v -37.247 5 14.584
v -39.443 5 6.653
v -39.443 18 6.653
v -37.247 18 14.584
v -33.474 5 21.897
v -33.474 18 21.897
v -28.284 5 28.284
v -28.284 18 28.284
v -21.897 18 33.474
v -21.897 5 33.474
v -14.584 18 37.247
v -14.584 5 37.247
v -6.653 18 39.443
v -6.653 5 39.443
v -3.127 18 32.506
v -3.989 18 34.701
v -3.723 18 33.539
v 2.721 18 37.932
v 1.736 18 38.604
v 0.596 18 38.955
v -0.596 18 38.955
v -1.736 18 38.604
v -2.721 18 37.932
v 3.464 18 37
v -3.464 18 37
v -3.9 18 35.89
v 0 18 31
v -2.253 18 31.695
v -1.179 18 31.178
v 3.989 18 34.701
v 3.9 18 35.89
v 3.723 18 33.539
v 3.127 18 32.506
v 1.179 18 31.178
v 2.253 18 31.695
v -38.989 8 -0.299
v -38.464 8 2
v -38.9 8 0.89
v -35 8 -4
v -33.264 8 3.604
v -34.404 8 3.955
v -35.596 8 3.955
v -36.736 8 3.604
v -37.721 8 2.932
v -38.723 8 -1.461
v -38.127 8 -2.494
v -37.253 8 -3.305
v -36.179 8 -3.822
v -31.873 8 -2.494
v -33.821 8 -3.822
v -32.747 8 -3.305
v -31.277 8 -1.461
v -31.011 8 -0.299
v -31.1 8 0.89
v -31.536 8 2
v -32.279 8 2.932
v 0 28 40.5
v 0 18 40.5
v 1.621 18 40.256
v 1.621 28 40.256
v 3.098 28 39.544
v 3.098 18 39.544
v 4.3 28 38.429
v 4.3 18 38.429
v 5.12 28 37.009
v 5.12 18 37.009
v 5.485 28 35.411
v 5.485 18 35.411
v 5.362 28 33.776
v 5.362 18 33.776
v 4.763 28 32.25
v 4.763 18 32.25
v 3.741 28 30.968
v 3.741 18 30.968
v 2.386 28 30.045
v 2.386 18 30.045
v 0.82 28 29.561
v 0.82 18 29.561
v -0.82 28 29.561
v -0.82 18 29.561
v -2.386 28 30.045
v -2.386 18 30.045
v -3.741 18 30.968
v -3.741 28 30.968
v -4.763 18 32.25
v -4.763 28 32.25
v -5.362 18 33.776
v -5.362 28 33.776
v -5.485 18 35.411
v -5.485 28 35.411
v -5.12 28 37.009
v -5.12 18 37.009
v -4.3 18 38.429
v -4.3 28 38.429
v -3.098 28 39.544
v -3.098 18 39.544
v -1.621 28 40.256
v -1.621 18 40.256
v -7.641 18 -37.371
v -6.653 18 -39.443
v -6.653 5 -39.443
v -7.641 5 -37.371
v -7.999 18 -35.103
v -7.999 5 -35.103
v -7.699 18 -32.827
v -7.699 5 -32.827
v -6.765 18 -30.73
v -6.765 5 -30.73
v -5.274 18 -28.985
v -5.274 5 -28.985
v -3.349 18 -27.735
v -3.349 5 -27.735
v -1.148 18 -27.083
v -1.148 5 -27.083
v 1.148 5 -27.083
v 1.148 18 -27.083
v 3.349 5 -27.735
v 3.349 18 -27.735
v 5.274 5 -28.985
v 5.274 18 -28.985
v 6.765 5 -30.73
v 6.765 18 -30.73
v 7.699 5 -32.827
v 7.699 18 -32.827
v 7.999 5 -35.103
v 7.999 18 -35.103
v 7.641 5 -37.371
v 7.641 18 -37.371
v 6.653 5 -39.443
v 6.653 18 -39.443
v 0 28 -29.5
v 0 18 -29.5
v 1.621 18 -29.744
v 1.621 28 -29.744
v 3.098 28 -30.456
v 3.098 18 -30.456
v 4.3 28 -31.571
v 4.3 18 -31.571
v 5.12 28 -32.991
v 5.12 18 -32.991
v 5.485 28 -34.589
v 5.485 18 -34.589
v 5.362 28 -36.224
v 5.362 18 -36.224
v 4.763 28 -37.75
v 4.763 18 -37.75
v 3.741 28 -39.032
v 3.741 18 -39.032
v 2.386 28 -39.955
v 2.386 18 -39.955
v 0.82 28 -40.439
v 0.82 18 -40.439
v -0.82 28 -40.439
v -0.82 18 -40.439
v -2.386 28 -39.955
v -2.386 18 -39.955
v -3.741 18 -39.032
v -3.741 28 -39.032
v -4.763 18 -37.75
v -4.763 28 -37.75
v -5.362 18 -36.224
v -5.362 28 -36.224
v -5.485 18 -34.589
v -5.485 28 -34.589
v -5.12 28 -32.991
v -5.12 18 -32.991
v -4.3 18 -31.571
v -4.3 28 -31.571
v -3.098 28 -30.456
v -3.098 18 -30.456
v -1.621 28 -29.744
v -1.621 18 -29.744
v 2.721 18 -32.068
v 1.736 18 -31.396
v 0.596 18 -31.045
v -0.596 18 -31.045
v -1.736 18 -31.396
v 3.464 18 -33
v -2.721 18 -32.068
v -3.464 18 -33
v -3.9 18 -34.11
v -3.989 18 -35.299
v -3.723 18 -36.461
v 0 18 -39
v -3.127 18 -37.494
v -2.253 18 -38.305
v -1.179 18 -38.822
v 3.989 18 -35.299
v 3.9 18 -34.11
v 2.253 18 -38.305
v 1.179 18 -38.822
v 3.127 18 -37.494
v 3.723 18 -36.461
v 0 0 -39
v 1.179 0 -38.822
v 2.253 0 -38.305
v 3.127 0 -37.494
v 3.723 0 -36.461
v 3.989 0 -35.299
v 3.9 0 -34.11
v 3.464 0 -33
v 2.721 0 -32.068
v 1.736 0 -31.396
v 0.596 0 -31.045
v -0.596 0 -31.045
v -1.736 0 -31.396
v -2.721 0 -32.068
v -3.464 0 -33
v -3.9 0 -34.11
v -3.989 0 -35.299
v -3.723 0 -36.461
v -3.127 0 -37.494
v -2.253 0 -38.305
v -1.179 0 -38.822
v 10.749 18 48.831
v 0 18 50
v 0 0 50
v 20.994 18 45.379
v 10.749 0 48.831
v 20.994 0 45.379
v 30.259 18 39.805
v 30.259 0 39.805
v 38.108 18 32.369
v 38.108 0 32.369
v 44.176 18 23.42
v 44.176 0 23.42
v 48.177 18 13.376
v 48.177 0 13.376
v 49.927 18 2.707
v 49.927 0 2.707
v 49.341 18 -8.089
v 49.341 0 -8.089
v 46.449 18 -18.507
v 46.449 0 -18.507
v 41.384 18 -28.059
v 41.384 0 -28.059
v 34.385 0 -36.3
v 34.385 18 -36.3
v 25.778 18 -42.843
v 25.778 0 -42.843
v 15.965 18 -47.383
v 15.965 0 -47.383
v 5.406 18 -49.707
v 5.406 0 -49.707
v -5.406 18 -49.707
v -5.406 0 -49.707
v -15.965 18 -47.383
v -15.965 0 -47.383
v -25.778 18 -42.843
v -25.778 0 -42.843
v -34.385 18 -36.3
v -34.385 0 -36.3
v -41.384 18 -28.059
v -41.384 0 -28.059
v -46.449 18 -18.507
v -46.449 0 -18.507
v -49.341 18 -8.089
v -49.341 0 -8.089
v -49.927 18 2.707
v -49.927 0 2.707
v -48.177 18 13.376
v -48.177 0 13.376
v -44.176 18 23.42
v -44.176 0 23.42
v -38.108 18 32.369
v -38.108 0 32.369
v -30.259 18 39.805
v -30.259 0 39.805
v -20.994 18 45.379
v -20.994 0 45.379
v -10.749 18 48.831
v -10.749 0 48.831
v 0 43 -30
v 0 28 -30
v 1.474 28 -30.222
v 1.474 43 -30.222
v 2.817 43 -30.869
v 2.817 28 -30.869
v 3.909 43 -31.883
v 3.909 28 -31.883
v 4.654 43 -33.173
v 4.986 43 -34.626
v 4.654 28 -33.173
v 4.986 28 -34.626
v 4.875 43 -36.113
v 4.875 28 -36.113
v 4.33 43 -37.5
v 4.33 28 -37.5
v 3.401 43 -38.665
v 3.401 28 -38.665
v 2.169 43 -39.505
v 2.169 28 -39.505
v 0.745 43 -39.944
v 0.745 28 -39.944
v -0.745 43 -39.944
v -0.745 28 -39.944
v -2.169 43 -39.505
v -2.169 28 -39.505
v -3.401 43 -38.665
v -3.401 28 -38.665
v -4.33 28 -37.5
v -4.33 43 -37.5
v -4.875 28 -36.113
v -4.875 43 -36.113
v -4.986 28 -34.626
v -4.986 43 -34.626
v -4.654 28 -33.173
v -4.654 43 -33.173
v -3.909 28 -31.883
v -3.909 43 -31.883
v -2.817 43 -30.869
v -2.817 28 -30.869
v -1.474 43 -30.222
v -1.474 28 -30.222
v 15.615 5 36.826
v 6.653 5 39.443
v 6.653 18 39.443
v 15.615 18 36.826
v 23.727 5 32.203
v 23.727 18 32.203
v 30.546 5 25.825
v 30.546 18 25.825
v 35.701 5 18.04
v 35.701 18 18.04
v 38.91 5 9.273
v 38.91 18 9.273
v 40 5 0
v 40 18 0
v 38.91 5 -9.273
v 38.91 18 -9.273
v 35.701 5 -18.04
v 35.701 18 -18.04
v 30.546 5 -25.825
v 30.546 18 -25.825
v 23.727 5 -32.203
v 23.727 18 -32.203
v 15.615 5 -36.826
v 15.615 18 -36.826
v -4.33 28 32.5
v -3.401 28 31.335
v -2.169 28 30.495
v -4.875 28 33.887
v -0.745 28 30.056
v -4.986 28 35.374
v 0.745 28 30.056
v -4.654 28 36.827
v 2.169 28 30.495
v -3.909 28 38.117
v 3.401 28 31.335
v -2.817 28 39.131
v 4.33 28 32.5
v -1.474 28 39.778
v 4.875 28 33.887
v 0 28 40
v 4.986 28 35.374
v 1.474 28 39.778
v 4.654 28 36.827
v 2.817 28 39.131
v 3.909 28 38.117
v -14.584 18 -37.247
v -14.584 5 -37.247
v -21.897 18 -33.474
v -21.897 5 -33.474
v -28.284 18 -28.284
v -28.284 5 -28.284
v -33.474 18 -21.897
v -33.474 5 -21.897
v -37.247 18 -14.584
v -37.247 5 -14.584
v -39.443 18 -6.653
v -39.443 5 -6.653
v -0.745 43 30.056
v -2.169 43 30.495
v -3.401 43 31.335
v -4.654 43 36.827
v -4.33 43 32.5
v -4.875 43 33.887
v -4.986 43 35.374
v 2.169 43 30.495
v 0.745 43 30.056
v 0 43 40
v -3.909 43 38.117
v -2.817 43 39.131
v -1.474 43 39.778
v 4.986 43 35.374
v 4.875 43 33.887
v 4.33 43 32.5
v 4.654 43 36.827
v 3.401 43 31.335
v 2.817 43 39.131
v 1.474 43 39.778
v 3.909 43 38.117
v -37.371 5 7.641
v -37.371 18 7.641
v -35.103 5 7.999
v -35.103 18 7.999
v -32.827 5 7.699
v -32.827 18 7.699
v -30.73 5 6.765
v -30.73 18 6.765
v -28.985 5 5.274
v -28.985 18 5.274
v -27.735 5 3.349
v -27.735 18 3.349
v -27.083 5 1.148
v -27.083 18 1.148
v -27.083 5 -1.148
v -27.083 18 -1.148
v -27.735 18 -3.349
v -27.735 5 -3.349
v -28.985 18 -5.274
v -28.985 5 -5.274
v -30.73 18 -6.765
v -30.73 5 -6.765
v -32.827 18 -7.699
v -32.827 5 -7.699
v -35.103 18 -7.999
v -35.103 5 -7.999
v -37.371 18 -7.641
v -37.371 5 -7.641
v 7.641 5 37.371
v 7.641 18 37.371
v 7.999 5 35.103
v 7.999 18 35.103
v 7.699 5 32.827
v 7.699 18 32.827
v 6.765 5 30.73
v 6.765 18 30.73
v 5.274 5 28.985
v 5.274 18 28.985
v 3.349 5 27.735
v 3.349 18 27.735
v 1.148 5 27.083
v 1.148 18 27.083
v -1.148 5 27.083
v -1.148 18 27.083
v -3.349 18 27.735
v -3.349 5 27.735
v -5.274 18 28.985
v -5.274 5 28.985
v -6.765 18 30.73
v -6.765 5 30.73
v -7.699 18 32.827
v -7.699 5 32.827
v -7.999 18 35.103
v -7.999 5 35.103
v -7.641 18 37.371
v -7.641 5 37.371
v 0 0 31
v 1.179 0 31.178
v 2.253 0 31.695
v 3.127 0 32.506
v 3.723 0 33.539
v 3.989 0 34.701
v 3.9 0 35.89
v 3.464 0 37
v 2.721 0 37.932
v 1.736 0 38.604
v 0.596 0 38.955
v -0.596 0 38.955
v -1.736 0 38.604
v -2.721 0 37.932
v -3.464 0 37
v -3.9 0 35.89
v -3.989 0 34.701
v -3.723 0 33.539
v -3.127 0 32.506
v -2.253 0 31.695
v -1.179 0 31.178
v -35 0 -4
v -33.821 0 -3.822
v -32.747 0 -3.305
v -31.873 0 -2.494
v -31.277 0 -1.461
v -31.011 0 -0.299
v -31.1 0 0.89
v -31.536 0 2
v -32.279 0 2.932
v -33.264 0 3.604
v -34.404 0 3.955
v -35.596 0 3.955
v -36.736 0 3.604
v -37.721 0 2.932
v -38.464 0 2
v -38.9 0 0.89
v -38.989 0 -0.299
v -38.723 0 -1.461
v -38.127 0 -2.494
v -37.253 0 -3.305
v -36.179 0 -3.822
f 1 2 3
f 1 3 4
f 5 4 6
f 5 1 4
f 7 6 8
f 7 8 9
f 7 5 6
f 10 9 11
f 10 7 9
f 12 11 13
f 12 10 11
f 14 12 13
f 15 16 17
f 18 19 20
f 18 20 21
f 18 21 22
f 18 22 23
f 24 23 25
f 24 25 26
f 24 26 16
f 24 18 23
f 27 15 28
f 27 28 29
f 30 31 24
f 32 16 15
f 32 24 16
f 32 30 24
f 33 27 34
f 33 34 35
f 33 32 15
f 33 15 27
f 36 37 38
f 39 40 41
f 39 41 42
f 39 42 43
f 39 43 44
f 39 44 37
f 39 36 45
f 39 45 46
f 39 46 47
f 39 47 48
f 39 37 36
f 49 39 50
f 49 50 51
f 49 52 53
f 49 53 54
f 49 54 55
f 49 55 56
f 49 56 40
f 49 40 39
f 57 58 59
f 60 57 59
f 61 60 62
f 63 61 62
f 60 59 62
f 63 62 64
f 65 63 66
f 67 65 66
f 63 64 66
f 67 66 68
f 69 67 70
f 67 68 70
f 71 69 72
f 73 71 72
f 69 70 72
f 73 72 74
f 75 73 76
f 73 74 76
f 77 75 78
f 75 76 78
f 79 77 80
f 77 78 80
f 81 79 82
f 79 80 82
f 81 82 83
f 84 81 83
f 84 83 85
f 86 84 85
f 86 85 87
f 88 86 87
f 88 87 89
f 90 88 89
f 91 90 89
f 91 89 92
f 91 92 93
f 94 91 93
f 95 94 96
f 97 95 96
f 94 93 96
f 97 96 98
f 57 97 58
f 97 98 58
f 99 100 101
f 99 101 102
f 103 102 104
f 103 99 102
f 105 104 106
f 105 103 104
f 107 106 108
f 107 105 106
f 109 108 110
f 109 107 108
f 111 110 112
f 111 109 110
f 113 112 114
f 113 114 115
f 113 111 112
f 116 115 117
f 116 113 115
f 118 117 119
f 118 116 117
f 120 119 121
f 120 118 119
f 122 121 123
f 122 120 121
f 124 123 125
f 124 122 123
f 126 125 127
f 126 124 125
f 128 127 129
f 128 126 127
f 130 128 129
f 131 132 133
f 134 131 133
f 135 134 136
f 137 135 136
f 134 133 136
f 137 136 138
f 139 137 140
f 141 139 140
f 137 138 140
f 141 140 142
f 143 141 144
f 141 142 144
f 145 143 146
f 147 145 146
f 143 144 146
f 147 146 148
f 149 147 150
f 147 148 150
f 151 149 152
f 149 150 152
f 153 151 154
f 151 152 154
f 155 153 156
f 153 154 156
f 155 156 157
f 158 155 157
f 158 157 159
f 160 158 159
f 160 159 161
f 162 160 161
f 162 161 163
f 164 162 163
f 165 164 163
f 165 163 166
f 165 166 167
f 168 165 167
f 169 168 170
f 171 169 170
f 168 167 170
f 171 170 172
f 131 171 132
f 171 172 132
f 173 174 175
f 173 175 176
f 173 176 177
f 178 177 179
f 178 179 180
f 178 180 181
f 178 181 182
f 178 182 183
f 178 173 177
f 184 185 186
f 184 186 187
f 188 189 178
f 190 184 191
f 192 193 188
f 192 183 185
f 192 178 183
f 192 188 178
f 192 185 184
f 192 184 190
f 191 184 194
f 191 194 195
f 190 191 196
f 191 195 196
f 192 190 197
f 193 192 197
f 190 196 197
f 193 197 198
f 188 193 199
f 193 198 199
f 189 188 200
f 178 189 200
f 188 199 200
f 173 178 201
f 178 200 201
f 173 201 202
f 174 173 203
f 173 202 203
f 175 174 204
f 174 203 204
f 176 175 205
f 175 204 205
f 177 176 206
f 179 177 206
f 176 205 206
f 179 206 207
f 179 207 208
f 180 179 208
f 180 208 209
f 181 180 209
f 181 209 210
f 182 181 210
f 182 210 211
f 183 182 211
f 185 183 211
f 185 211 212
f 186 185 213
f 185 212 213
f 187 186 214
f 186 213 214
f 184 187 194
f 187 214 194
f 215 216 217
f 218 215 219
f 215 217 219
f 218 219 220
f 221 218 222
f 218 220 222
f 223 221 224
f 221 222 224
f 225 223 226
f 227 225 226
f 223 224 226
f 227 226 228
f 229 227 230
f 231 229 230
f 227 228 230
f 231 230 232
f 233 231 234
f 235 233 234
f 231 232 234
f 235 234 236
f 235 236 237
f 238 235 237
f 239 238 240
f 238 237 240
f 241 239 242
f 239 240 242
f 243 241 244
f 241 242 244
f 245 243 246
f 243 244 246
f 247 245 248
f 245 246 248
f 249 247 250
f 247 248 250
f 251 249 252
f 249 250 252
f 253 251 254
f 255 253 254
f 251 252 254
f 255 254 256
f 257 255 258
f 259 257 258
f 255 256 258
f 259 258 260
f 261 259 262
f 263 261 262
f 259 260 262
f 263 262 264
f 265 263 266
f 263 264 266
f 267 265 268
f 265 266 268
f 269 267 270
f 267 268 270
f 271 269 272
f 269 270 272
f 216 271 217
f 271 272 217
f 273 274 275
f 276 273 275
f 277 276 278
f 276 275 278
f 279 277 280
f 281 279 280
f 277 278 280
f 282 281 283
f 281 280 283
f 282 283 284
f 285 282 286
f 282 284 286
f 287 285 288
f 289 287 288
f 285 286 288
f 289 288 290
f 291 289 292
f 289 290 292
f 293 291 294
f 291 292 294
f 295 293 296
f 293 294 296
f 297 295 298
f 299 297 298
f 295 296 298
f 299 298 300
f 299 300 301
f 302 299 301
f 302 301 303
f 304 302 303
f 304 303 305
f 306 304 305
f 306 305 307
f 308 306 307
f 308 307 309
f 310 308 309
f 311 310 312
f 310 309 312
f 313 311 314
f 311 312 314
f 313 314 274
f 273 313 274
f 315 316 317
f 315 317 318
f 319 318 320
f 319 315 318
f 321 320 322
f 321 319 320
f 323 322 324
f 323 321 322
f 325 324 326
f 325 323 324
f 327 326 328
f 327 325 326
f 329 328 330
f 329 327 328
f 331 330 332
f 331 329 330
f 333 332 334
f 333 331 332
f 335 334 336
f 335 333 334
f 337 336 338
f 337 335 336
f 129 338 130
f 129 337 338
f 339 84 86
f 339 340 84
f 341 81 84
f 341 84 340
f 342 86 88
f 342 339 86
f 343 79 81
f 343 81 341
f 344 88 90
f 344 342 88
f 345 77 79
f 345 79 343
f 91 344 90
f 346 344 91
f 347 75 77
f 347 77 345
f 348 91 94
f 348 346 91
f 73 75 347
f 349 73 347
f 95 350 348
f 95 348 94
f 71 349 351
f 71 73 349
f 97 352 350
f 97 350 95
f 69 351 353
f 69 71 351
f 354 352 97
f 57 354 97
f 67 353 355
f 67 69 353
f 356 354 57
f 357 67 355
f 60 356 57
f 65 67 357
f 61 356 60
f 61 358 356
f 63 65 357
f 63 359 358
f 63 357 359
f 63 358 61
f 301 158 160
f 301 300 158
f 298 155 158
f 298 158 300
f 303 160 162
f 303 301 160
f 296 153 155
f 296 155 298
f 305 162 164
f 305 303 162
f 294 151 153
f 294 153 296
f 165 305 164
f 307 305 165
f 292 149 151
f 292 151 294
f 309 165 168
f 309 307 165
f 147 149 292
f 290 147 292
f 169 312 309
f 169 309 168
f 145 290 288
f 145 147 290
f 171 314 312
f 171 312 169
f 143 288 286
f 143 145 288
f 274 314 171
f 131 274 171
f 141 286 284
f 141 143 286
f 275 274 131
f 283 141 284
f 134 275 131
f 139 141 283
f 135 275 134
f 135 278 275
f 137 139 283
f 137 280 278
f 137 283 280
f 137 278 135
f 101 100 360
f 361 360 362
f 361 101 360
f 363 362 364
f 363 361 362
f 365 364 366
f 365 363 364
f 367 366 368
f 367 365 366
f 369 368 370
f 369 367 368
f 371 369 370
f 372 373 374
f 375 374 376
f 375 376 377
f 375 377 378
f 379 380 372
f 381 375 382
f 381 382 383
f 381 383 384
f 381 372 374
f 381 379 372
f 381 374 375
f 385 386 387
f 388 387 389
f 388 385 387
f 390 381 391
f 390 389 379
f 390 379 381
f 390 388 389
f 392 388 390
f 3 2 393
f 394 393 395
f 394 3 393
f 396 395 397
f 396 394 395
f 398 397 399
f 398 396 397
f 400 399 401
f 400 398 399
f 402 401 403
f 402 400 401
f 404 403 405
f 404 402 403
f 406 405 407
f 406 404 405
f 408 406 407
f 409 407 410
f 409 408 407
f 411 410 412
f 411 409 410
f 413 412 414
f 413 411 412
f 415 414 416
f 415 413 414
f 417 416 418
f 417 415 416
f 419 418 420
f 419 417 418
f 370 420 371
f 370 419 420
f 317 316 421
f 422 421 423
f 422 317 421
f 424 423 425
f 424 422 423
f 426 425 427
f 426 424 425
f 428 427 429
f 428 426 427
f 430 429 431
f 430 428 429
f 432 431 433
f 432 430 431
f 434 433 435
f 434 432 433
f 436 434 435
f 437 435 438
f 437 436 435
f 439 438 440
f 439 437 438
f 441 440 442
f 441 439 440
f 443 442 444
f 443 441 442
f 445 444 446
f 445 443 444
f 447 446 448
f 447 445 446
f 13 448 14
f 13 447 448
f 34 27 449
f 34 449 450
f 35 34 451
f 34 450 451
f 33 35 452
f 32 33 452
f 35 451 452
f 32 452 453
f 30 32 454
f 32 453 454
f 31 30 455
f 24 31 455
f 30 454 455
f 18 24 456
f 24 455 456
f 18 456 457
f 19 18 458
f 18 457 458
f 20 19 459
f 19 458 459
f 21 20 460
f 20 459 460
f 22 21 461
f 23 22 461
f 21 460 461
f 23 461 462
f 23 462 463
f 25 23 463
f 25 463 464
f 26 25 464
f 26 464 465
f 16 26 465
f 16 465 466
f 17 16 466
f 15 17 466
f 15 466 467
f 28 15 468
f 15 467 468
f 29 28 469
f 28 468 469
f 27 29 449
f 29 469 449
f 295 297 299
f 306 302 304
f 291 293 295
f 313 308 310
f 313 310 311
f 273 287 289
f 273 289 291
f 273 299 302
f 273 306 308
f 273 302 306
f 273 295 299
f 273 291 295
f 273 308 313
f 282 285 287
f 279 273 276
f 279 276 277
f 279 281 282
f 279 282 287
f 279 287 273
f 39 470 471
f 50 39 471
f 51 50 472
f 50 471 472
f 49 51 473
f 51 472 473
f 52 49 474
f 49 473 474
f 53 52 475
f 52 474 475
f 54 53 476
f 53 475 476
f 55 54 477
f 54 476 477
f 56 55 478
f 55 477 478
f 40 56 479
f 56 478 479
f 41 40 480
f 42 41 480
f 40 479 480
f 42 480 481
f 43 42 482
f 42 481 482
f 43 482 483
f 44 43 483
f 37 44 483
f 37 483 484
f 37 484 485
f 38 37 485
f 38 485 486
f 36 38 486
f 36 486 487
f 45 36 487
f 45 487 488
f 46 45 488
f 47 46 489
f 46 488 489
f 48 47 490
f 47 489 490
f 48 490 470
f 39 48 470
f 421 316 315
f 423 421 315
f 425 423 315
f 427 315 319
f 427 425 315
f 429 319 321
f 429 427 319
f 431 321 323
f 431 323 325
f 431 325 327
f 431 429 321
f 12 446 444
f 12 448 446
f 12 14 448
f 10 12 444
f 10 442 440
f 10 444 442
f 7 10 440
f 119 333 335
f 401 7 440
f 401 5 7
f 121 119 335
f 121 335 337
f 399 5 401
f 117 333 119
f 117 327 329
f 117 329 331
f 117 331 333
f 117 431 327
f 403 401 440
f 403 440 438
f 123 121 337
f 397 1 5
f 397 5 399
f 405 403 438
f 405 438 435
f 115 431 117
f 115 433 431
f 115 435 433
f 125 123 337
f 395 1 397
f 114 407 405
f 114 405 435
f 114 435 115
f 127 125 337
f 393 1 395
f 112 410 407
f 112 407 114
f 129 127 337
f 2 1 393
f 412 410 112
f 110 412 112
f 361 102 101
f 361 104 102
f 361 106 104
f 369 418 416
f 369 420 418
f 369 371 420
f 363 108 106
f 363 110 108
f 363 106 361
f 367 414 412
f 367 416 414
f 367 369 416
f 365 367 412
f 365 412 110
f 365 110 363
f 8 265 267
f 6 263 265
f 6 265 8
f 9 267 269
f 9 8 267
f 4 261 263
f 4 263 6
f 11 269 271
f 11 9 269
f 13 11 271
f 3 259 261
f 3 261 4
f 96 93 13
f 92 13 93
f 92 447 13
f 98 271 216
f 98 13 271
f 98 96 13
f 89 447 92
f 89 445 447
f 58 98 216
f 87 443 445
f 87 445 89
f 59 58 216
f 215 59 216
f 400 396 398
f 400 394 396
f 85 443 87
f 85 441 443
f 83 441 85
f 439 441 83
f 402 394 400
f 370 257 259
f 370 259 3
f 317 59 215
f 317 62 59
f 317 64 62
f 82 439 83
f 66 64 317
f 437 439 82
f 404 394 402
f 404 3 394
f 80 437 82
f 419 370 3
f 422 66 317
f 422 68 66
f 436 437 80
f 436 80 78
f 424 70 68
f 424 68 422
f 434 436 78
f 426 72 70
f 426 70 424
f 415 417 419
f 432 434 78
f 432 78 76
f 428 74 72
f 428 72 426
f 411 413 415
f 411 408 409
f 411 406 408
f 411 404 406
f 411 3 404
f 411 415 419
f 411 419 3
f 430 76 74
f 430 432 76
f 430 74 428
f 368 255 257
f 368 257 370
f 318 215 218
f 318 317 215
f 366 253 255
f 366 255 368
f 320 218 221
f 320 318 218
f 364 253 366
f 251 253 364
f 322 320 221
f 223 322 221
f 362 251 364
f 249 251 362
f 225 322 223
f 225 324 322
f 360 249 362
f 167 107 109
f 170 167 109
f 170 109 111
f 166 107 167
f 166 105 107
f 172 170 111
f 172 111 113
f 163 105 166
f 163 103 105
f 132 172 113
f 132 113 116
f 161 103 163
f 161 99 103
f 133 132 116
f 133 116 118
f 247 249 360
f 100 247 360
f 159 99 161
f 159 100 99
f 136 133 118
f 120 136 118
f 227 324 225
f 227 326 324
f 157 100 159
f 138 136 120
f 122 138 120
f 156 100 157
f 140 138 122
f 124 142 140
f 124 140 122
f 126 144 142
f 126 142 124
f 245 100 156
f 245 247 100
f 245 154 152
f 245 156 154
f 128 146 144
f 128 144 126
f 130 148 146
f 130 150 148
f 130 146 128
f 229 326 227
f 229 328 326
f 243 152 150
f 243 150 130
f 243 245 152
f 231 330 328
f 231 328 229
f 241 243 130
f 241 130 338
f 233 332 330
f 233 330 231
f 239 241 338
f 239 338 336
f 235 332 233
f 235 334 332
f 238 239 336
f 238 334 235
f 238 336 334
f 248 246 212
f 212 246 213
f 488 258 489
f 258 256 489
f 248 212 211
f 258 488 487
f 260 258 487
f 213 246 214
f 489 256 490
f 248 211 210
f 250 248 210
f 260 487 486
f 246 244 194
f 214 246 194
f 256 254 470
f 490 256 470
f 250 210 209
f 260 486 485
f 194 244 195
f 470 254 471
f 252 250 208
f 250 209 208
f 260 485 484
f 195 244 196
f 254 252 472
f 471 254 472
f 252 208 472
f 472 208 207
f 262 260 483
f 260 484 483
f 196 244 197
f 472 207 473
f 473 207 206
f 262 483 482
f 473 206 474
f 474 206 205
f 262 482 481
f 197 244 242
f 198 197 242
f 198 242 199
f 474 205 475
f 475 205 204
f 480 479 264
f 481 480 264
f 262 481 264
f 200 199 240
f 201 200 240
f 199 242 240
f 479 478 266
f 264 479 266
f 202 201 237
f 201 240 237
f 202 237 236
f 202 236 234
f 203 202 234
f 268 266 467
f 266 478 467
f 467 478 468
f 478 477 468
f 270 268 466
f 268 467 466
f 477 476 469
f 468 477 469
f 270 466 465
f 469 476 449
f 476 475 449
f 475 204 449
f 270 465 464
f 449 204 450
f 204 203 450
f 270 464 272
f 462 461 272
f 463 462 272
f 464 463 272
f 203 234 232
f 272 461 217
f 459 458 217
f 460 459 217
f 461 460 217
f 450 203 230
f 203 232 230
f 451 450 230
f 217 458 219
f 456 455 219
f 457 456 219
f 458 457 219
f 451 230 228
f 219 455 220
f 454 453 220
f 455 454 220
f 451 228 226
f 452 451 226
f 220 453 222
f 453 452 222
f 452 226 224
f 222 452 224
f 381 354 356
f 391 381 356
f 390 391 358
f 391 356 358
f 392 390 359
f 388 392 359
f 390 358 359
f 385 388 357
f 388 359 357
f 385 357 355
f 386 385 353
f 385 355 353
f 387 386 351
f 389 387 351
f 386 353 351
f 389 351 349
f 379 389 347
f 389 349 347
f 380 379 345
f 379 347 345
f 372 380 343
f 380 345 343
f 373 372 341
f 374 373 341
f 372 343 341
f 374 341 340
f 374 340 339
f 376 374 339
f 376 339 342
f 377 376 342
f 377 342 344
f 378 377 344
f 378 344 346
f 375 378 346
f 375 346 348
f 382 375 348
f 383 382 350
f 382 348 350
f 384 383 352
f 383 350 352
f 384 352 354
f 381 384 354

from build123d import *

# Parameters (mm, degrees)
SKETCH1_R           = 50
BOSS_EXTRUDE1_DEPTH = 18
CUT_EXTRUDE1_START  = 5
SKETCH1_3_R         = 40
CUT_EXTRUDE1_DEPTH  = 13
BOSS_EXTRUDE2_REACH = 74.966
SKETCH2_R           = 8
SKETCH3_R           = 5.5
BOSS_EXTRUDE3_DEPTH = 10
SKETCH4_R           = 5
BOSS_EXTRUDE4_DEPTH = 15
SKETCH5_R           = 4
CUT_EXTRUDE2_DEPTH  = 18
SKETCH5_3_R         = 4
CUT_EXTRUDE3_DEPTH  = 8


with BuildPart() as part:
    # Sketch1 → Boss-Extrude1 (new body)
    with BuildSketch(Plane(origin=(0, 0, 0), x_dir=(1, 0, 0), z_dir=(0, 1, 0))):
        Circle(SKETCH1_R)
    extrude(amount=BOSS_EXTRUDE1_DEPTH)

    # Sketch1<3> → Cut-Extrude1 (cut)
    with BuildSketch(Plane(origin=(0, 0, 0), x_dir=(1, 0, 0), z_dir=(0, 1, 0)).offset(CUT_EXTRUDE1_START)):
        Circle(SKETCH1_3_R)
    extrude(amount=CUT_EXTRUDE1_DEPTH, mode=Mode.SUBTRACT)

    # Sketch2 → Boss-Extrude2 (add, up to next)
    with BuildSketch(Plane(origin=(0, 18, 0), x_dir=(1, 0, 0), z_dir=(0, 1, 0)), mode=Mode.PRIVATE) as boss_extrude2_sk1:
        with Locations((0, 35)):
            Circle(SKETCH2_R)
    boss_extrude2_tool1 = extrude(boss_extrude2_sk1.sketch, amount=-BOSS_EXTRUDE2_REACH, mode=Mode.PRIVATE) - part.part
    # Sketch2 → Boss-Extrude2 (add, up to next)
    with BuildSketch(Plane(origin=(0, 18, 0), x_dir=(1, 0, 0), z_dir=(0, 1, 0)), mode=Mode.PRIVATE) as boss_extrude2_sk2:
        with Locations((0, -35)):
            Circle(SKETCH2_R)
    boss_extrude2_tool2 = extrude(boss_extrude2_sk2.sketch, amount=-BOSS_EXTRUDE2_REACH, mode=Mode.PRIVATE) - part.part
    # Sketch2 → Boss-Extrude2 (add, up to next)
    with BuildSketch(Plane(origin=(0, 18, 0), x_dir=(1, 0, 0), z_dir=(0, 1, 0)), mode=Mode.PRIVATE) as boss_extrude2_sk3:
        with Locations((-35, 0)):
            Circle(SKETCH2_R)
    boss_extrude2_tool3 = extrude(boss_extrude2_sk3.sketch, amount=-BOSS_EXTRUDE2_REACH, mode=Mode.PRIVATE) - part.part
    add(boss_extrude2_tool1.solids().sort_by_distance((0, 18, -35))[0])
    add(boss_extrude2_tool2.solids().sort_by_distance((0, 18, 35))[0])
    add(boss_extrude2_tool3.solids().sort_by_distance((-35, 18, 0))[0])

    # Sketch3 → Boss-Extrude3 (add)
    with BuildSketch(Plane(origin=(0, 18, 0), x_dir=(1, 0, 0), z_dir=(0, 1, 0))):
        with Locations((0, 35)):
            Circle(SKETCH3_R)
        with Locations((0, -35)):
            Circle(SKETCH3_R)
    extrude(amount=BOSS_EXTRUDE3_DEPTH)

    # Sketch4 → Boss-Extrude4 (add)
    with BuildSketch(Plane(origin=(0, 28, 0), x_dir=(1, 0, 0), z_dir=(0, 1, 0))):
        with Locations((0, -35)):
            Circle(SKETCH4_R)
        with Locations((0, 35)):
            Circle(SKETCH4_R)
    extrude(amount=BOSS_EXTRUDE4_DEPTH)

    # Sketch5 → Cut-Extrude2 (cut)
    with BuildSketch(Plane.XZ):
        with Locations((0, 35)):
            Circle(SKETCH5_R)
        with Locations((0, -35)):
            Circle(SKETCH5_R)
    extrude(amount=-CUT_EXTRUDE2_DEPTH, mode=Mode.SUBTRACT)

    # Sketch5<3> → Cut-Extrude3 (cut)
    with BuildSketch(Plane.XZ):
        with Locations((-35, 0)):
            Circle(SKETCH5_3_R)
    extrude(amount=-CUT_EXTRUDE3_DEPTH, mode=Mode.SUBTRACT)


solid = part.part
